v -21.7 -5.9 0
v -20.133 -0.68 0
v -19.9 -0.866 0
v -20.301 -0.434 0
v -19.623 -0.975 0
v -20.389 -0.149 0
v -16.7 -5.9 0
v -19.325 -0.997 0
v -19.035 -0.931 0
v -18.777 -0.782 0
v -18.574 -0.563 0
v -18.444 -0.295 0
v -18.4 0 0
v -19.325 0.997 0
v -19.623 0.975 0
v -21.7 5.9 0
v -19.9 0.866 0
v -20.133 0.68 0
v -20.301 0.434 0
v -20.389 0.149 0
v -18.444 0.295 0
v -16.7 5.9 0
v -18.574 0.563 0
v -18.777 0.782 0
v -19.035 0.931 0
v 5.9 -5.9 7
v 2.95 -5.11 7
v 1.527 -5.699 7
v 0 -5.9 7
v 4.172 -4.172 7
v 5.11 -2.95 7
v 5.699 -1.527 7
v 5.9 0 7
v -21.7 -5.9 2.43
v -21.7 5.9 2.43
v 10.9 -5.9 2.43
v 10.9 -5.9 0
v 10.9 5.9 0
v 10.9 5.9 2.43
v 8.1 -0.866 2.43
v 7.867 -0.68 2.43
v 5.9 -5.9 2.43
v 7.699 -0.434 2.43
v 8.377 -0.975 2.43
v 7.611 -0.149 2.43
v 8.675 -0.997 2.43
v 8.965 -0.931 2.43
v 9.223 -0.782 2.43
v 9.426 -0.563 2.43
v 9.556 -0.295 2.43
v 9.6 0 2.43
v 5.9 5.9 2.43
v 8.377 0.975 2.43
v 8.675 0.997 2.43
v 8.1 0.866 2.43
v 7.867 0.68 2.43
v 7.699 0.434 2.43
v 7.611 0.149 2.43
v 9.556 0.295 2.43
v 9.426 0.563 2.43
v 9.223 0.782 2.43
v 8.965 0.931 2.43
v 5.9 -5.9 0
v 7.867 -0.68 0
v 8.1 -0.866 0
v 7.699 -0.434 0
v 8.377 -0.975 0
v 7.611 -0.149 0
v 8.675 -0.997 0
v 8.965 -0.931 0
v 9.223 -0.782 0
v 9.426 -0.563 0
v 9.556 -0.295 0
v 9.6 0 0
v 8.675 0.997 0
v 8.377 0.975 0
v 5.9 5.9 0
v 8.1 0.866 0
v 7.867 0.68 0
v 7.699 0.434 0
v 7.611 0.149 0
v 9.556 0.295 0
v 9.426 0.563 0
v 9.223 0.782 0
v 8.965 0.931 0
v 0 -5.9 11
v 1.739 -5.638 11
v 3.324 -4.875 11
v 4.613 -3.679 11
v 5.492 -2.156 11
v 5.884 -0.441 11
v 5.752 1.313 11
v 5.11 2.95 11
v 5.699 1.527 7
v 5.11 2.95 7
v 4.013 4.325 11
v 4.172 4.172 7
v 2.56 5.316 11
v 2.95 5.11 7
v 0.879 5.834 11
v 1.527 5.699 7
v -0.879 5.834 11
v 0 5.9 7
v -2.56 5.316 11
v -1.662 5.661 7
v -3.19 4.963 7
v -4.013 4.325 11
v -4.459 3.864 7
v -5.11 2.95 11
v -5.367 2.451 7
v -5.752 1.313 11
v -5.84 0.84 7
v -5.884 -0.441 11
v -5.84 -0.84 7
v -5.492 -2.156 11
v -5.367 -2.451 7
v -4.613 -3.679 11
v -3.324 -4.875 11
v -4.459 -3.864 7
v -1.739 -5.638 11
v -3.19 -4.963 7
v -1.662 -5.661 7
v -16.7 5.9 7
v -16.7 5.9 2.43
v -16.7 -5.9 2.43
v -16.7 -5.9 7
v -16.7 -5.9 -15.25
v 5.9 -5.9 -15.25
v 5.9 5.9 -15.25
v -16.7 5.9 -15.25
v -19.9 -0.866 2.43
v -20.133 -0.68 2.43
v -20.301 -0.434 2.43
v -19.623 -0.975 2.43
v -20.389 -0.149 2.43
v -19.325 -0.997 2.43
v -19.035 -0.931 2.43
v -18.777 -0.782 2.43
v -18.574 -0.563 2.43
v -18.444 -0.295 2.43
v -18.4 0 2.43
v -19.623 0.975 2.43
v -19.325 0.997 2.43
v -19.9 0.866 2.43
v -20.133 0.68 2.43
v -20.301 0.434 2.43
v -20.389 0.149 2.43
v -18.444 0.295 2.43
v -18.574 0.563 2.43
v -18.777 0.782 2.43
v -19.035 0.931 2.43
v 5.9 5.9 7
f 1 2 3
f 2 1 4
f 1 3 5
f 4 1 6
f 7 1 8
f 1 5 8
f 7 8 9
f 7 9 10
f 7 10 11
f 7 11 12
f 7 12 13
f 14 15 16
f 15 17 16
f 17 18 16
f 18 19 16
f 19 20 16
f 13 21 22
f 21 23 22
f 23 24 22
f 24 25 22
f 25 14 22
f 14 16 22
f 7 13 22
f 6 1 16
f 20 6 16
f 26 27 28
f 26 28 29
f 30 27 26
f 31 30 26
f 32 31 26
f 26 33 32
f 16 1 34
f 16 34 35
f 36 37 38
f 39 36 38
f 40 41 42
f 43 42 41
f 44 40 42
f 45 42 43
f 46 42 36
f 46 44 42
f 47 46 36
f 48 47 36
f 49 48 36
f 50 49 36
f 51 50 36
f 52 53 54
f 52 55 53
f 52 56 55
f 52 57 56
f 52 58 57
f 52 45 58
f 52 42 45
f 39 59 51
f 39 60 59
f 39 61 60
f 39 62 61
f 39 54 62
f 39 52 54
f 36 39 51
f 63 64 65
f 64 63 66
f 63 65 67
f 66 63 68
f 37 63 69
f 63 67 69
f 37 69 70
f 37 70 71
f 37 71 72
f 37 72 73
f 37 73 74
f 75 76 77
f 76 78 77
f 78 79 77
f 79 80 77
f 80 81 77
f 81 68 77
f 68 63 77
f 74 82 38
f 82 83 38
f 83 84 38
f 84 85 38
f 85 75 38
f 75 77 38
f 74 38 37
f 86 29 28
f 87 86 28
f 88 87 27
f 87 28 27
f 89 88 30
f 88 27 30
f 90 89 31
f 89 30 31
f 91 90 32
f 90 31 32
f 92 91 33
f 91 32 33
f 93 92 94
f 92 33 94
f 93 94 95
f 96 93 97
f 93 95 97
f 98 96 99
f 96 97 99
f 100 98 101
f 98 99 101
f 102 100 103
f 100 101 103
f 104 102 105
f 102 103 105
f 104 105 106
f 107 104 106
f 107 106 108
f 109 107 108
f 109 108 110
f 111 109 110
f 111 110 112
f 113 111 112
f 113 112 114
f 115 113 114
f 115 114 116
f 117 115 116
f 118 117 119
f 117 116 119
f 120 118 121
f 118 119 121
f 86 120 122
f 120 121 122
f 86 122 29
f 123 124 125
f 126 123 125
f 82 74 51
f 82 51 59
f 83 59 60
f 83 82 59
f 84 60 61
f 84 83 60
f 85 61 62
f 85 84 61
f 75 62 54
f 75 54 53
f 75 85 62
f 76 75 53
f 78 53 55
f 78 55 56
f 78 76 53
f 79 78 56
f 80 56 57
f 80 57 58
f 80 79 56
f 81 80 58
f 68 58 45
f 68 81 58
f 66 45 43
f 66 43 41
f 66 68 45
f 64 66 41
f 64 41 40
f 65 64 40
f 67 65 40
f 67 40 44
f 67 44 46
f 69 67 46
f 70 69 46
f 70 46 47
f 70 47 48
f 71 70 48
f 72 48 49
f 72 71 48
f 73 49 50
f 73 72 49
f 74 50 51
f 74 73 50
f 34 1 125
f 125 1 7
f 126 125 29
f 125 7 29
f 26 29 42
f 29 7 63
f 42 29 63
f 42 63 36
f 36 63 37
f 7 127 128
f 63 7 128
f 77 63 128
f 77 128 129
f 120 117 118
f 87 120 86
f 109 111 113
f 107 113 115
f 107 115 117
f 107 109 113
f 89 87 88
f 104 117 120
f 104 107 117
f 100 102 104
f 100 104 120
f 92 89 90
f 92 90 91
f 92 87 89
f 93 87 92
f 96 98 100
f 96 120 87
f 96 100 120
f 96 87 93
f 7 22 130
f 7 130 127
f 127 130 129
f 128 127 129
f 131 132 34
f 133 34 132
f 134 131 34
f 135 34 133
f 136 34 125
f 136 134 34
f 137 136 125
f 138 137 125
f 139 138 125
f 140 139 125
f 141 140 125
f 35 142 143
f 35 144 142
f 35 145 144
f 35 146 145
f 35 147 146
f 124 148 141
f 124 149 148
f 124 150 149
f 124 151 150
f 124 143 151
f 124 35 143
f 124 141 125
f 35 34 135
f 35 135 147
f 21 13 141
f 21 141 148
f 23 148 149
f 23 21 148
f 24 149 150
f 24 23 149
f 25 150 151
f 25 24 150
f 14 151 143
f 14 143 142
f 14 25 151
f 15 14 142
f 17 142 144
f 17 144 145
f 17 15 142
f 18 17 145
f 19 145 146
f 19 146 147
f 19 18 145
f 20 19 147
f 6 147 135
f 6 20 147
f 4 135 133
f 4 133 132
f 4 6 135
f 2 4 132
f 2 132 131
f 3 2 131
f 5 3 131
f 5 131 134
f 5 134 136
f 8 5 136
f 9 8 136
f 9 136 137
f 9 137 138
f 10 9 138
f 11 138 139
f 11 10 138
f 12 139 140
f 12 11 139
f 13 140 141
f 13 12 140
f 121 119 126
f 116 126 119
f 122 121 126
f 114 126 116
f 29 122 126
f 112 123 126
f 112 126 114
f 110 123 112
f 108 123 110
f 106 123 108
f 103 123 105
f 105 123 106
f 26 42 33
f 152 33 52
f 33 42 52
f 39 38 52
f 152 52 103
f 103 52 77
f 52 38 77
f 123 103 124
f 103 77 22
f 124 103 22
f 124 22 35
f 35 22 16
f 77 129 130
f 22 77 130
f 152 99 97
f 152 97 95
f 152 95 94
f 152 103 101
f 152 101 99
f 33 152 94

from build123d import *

# Parameters (mm, degrees)
F0_W     = 5
F0_H     = 11.8
F0_R     = 1
F1_DEPTH = 2.43
F2_DEPTH = 7
F3_DEPTH = 11
F4_DEPTH = 15.25


with BuildPart() as f1:
    # F0 (on Top) → F1 (new body)
    with BuildSketch(Plane.XY):
        with Locations((-19.2, 0)):
            Rectangle(F0_W, F0_H)
        with Locations((-19.4, 0)):
            Circle(F0_R, mode=Mode.SUBTRACT)
        with BuildLine():
            Line((6e-09, 5.9), (-16.7, 5.9))
            Line((-16.7, 5.9), (-16.7, -5.9))
            Line((-16.7, -5.9), (1.1e-09, -5.9))
            ThreePointArc((1.1e-09, -5.9), (-5.9, 2.4e-09), (6e-09, 5.9))
        make_face()
        with BuildLine():
            ThreePointArc((5.9, 0), (4.1719300111, 4.1719300069), (6e-09, 5.9))
            ThreePointArc((6e-09, 5.9), (-5.9, 2.4e-09), (1.1e-09, -5.9))
            ThreePointArc((1.1e-09, -5.9), (4.1719300094, -4.1719300086), (5.9, 0))
        make_face()
        with BuildLine():
            Line((5.9, 5.9), (6e-09, 5.9))
            ThreePointArc((6e-09, 5.9), (4.1719300111, 4.1719300069), (5.9, 0))
            Line((5.9, 0), (5.9, 5.9))
        make_face()
        with BuildLine():
            Line((5.9, -5.9), (5.9, 0))
            ThreePointArc((5.9, 0), (4.1719300094, -4.1719300086), (1.1e-09, -5.9))
            Line((1.1e-09, -5.9), (5.9, -5.9))
        make_face()
        Polygon((10.9, 5.9), (5.9, 5.9), (5.9, 0), (5.9, -5.9), (10.9, -5.9), align=None)
        with Locations((8.6, 0)):
            Circle(F0_R, mode=Mode.SUBTRACT)
    extrude(amount=F1_DEPTH)

    # F0 (on Top) → F2 (join)
    with BuildSketch(Plane.XY):
        with BuildLine():
            Line((6e-09, 5.9), (-16.7, 5.9))
            Line((-16.7, 5.9), (-16.7, -5.9))
            Line((-16.7, -5.9), (1.1e-09, -5.9))
            ThreePointArc((1.1e-09, -5.9), (-5.9, 2.4e-09), (6e-09, 5.9))
        make_face()
        with BuildLine():
            ThreePointArc((5.9, 0), (4.1719300111, 4.1719300069), (6e-09, 5.9))
            ThreePointArc((6e-09, 5.9), (-5.9, 2.4e-09), (1.1e-09, -5.9))
            ThreePointArc((1.1e-09, -5.9), (4.1719300094, -4.1719300086), (5.9, 0))
        make_face()
        with BuildLine():
            Line((5.9, -5.9), (5.9, 0))
            ThreePointArc((5.9, 0), (4.1719300094, -4.1719300086), (1.1e-09, -5.9))
            Line((1.1e-09, -5.9), (5.9, -5.9))
        make_face()
        with BuildLine():
            Line((5.9, 5.9), (6e-09, 5.9))
            ThreePointArc((6e-09, 5.9), (4.1719300111, 4.1719300069), (5.9, 0))
            Line((5.9, 0), (5.9, 5.9))
        make_face()
    extrude(amount=F2_DEPTH)

    # F0 (on Top) → F3 (join)
    with BuildSketch(Plane.XY):
        with BuildLine():
            ThreePointArc((5.9, 0), (4.1719300111, 4.1719300069), (6e-09, 5.9))
            ThreePointArc((6e-09, 5.9), (-5.9, 2.4e-09), (1.1e-09, -5.9))
            ThreePointArc((1.1e-09, -5.9), (4.1719300094, -4.1719300086), (5.9, 0))
        make_face()
    extrude(amount=F3_DEPTH)

    # F0 (on Top) → F4 (join)
    with BuildSketch(Plane.XY):
        with BuildLine():
            Line((6e-09, 5.9), (-16.7, 5.9))
            Line((-16.7, 5.9), (-16.7, -5.9))
            Line((-16.7, -5.9), (1.1e-09, -5.9))
            ThreePointArc((1.1e-09, -5.9), (-5.9, 2.4e-09), (6e-09, 5.9))
        make_face()
        with BuildLine():
            ThreePointArc((5.9, 0), (4.1719300111, 4.1719300069), (6e-09, 5.9))
            ThreePointArc((6e-09, 5.9), (-5.9, 2.4e-09), (1.1e-09, -5.9))
            ThreePointArc((1.1e-09, -5.9), (4.1719300094, -4.1719300086), (5.9, 0))
        make_face()
        with BuildLine():
            Line((5.9, -5.9), (5.9, 0))
            ThreePointArc((5.9, 0), (4.1719300094, -4.1719300086), (1.1e-09, -5.9))
            Line((1.1e-09, -5.9), (5.9, -5.9))
        make_face()
        with BuildLine():
            Line((5.9, 5.9), (6e-09, 5.9))
            ThreePointArc((6e-09, 5.9), (4.1719300111, 4.1719300069), (5.9, 0))
            Line((5.9, 0), (5.9, 5.9))
        make_face()
    extrude(amount=-F4_DEPTH)


solid = f1.part
